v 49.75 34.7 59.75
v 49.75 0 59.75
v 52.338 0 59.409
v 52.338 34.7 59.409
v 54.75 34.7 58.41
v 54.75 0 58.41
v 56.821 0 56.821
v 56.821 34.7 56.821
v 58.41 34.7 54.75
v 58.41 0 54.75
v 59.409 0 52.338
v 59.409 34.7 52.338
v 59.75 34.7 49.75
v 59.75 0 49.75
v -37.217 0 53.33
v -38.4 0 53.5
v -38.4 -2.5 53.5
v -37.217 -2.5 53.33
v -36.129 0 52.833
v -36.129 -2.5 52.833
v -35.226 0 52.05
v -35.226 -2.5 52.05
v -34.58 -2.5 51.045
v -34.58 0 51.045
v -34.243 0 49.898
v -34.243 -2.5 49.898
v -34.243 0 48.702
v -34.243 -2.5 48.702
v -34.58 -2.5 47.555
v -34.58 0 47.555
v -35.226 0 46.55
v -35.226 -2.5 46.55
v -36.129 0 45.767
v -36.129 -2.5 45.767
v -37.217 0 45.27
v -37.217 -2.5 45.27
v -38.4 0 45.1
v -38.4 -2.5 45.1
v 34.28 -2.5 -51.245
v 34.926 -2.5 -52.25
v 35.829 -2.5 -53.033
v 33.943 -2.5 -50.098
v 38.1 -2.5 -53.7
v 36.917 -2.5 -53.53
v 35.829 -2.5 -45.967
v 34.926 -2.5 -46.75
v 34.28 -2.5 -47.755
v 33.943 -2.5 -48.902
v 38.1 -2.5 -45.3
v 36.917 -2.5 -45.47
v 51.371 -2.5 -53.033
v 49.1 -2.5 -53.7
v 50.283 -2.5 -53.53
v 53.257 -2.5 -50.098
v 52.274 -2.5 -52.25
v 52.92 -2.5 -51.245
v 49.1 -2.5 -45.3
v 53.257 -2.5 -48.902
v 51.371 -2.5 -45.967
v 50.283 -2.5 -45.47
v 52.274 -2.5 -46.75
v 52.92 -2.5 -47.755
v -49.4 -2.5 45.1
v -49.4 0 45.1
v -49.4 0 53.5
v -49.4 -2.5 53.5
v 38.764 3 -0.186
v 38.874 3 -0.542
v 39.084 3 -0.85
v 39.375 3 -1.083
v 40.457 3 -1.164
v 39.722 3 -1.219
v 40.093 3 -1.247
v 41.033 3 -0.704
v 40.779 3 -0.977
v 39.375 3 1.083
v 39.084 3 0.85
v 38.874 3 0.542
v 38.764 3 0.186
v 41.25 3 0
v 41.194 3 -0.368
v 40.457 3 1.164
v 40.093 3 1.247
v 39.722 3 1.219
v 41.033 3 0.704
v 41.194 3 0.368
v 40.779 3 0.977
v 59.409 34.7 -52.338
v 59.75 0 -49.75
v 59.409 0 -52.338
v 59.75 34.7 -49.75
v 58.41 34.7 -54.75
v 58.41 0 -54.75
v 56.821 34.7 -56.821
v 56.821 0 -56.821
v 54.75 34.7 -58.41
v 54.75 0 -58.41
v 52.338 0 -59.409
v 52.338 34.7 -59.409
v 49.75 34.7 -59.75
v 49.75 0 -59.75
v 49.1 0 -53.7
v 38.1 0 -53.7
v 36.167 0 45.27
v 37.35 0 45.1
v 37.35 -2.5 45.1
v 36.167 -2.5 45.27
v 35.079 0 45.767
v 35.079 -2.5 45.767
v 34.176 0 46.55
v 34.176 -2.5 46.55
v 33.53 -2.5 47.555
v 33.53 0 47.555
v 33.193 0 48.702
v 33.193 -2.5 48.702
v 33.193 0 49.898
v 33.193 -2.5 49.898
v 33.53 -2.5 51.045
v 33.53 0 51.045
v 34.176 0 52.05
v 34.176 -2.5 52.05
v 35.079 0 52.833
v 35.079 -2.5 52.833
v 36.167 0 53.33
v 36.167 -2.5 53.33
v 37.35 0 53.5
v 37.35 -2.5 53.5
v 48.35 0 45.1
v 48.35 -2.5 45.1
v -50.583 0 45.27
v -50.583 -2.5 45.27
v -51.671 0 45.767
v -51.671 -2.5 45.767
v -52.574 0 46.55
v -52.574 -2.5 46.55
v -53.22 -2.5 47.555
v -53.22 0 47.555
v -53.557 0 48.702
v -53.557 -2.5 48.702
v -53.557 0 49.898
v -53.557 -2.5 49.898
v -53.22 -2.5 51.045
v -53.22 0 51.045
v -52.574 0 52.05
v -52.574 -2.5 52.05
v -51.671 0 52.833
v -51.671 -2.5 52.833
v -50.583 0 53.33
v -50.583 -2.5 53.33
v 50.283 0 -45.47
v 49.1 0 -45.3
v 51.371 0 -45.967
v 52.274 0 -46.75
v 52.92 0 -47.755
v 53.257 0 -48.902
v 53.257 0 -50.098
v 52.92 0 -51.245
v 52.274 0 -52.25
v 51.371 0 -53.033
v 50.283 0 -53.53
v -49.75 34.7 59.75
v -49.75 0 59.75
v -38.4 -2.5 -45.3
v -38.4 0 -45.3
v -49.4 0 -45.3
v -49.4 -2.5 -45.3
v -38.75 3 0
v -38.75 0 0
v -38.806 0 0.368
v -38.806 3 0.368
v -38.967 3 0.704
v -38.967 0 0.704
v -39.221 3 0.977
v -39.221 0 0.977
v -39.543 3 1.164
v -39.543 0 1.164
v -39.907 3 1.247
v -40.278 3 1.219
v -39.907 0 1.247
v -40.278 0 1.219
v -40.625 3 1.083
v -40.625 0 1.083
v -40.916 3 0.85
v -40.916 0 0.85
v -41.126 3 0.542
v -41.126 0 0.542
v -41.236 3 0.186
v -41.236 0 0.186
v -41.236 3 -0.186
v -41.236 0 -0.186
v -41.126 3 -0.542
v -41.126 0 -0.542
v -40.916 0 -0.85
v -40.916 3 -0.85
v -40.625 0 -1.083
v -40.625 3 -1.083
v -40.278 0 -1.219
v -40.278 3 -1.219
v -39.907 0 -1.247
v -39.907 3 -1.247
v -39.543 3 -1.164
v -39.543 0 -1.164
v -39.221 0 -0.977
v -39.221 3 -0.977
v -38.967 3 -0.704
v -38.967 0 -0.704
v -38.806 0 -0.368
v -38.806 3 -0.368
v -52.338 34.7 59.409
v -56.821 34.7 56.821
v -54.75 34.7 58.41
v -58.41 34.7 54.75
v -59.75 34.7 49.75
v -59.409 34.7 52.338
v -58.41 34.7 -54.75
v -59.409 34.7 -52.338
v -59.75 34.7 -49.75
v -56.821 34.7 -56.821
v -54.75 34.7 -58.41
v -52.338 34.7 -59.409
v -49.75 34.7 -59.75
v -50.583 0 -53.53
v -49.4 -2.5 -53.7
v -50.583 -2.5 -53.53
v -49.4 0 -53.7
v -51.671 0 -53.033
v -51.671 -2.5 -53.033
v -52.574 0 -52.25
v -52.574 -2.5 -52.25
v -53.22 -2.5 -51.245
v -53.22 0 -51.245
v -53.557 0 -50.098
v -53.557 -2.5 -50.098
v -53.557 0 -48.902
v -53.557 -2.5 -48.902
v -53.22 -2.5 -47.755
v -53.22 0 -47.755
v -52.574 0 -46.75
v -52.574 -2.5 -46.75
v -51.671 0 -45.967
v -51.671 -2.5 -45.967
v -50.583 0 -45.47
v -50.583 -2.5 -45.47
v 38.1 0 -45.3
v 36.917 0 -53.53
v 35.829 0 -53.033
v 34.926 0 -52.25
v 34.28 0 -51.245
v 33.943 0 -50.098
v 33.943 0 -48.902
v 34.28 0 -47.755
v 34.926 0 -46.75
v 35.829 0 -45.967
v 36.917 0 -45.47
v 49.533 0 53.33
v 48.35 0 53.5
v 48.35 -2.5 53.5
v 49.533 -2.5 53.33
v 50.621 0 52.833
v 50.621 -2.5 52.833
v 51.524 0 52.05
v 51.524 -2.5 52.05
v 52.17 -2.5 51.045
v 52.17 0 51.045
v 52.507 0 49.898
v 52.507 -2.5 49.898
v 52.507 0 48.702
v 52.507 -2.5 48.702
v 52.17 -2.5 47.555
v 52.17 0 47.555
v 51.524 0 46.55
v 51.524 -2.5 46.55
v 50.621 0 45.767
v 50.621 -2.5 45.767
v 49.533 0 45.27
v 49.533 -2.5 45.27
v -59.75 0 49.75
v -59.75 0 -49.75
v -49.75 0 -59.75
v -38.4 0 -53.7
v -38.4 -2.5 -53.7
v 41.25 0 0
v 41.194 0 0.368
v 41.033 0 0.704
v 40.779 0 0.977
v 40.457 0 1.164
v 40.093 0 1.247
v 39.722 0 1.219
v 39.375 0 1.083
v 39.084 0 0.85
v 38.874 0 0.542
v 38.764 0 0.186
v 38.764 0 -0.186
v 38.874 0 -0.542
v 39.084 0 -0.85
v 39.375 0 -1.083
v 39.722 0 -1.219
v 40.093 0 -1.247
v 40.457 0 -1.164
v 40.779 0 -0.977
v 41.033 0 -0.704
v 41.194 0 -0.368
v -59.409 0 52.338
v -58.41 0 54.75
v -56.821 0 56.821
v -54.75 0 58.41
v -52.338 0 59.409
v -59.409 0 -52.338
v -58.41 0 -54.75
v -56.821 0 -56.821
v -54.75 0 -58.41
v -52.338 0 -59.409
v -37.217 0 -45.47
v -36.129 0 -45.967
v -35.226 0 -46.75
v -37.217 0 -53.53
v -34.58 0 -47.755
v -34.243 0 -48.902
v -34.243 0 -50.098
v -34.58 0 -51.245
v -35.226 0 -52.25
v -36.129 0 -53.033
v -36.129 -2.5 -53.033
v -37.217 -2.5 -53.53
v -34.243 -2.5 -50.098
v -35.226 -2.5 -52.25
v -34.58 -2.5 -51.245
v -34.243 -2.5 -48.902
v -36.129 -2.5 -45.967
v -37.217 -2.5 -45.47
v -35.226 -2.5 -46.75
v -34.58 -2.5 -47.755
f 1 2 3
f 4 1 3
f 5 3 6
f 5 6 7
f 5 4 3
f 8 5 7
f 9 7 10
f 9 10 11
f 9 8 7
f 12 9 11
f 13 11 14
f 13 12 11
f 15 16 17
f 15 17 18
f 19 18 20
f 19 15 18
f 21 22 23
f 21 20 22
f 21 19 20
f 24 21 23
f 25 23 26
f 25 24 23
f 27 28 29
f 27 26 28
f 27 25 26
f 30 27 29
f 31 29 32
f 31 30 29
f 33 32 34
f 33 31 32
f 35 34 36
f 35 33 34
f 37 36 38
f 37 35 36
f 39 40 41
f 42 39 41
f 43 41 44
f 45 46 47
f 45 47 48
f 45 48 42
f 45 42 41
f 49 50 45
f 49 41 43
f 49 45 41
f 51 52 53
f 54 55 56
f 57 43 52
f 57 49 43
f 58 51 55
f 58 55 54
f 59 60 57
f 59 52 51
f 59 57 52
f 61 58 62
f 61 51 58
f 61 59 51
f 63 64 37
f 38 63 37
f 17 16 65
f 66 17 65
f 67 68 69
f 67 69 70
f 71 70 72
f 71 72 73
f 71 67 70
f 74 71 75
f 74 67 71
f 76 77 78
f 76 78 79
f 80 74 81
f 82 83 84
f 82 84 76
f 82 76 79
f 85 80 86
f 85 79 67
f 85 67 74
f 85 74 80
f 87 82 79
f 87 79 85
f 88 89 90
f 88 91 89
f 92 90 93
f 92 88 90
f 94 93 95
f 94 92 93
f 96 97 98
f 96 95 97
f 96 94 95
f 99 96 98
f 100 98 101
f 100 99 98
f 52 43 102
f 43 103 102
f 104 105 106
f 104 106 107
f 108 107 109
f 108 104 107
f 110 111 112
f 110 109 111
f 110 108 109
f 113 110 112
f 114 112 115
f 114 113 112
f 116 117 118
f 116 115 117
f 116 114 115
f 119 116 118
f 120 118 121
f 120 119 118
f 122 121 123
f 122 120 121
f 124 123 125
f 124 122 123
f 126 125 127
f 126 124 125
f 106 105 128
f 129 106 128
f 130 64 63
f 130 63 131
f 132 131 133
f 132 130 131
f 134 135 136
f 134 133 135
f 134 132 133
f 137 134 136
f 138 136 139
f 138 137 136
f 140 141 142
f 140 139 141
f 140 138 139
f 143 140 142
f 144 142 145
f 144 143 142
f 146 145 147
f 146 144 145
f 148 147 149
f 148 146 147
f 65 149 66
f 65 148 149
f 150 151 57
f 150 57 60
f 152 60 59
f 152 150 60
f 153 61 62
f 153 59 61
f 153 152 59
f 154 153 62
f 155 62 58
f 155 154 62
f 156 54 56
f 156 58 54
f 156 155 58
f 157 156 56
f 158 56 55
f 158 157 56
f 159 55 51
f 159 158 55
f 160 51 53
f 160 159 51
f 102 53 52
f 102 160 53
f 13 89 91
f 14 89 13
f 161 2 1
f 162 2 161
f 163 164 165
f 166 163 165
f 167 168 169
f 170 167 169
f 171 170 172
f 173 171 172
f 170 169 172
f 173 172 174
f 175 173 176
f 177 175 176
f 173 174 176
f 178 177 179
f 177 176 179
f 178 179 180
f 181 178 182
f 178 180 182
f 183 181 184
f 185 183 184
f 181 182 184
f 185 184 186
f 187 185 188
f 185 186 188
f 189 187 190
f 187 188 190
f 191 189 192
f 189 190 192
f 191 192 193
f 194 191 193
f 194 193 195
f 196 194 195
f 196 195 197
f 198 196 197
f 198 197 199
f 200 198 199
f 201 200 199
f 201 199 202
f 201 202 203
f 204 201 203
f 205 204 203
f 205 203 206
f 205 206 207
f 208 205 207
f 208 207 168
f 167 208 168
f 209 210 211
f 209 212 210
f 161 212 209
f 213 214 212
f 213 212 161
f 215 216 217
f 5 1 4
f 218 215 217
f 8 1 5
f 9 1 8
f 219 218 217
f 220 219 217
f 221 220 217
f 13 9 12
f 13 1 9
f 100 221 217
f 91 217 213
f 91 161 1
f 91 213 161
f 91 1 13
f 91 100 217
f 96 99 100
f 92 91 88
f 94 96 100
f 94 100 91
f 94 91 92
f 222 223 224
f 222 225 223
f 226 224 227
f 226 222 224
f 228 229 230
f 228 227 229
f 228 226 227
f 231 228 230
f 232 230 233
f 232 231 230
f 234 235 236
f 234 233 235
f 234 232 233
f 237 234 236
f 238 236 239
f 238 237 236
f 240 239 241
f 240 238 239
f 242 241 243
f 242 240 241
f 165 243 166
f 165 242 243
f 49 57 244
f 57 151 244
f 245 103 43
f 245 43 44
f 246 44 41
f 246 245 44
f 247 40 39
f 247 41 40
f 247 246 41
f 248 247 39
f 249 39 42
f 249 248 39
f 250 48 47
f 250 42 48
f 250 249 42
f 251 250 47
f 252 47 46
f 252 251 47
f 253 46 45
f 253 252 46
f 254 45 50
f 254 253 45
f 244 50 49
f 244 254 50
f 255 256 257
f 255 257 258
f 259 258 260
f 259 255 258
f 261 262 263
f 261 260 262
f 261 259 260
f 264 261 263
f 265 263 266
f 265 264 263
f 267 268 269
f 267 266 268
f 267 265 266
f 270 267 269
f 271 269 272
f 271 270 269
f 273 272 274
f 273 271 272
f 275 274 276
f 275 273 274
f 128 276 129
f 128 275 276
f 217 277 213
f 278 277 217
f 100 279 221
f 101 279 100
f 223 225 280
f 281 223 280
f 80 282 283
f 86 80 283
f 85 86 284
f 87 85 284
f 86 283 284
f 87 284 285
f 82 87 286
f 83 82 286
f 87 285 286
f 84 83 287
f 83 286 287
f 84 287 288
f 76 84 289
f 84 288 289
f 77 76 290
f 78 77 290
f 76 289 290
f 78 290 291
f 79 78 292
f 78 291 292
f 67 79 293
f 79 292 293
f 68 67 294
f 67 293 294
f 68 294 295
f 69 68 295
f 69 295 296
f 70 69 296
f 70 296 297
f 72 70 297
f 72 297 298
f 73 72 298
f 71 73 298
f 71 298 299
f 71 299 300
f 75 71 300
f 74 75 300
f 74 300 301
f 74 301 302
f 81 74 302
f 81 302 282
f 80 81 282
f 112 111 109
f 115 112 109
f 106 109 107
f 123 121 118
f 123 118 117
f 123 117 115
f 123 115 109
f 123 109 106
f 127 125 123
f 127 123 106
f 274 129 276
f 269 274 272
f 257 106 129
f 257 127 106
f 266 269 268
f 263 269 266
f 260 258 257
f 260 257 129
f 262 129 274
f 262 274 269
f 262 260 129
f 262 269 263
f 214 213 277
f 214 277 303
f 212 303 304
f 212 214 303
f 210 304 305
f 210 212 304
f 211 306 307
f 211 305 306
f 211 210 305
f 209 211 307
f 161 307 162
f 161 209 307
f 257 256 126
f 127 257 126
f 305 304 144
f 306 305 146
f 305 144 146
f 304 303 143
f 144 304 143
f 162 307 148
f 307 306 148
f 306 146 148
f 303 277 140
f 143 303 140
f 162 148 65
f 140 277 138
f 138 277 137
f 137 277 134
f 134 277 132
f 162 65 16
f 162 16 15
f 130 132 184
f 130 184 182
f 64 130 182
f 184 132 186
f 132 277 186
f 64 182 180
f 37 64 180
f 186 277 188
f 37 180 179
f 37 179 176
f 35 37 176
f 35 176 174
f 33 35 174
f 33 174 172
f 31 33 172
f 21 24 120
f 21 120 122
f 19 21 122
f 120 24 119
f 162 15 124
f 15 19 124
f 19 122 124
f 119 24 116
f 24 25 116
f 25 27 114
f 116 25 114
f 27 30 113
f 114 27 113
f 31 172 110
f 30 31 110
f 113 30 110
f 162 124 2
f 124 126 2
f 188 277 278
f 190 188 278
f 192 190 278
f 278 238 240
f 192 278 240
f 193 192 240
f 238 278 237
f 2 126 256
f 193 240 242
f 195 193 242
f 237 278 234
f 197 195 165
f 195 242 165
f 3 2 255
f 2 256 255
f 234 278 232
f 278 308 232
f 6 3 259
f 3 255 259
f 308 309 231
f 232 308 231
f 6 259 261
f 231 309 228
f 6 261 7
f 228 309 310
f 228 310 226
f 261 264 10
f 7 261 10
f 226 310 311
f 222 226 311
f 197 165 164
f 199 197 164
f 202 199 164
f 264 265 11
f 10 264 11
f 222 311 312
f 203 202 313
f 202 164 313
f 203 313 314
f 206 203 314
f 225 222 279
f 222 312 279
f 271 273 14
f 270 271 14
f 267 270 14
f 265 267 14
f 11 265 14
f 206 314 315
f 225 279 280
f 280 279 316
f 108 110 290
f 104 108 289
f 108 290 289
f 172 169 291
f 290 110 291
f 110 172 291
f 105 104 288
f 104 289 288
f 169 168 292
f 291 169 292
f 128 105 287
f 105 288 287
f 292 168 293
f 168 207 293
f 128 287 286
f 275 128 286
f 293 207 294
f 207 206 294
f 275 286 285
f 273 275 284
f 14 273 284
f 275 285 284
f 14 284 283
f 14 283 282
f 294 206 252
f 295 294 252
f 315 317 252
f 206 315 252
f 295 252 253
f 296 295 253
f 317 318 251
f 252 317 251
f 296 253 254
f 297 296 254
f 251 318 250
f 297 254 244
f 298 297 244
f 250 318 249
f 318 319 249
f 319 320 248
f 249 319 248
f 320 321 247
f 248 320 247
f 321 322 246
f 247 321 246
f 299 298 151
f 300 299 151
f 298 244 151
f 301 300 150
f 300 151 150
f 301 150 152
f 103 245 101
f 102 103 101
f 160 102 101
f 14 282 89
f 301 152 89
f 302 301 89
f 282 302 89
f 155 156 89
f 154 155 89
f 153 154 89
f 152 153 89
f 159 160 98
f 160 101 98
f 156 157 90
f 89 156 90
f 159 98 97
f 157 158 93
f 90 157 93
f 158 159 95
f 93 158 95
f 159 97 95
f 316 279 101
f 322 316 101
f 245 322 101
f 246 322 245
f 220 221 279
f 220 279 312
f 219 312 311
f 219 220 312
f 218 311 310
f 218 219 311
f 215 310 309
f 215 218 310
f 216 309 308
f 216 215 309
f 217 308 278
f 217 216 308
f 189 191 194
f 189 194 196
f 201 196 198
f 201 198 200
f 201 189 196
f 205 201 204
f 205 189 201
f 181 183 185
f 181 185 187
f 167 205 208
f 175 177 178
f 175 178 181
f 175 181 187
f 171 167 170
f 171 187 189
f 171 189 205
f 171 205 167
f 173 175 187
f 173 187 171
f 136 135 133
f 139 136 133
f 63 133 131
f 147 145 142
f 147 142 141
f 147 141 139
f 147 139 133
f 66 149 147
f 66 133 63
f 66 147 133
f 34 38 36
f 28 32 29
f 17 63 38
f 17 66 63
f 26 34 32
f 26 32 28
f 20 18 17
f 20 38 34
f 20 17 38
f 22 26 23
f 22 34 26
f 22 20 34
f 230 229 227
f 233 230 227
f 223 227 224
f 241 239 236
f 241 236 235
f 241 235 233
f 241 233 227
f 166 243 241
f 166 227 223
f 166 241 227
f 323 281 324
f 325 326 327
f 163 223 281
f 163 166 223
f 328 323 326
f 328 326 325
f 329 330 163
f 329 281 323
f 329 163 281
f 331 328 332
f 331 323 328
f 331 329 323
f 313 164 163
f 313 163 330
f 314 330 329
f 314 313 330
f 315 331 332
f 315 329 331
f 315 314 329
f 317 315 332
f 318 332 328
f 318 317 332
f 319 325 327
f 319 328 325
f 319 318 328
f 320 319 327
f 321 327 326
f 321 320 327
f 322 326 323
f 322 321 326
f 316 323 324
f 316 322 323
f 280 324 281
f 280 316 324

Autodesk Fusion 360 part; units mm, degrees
sketch "Sketch1" plane through (0, 0, 0) normal (0, 1, 0) x (1, 0, 0)
  line L0 (59.75, -59.75) -> (-59.75, -59.75)
  line L1 (-59.75, -59.75) -> (-59.75, 59.75)
  line L2 (-59.75, 59.75) -> (59.75, 59.75)
  line L3 (59.75, 59.75) -> (59.75, -59.75)
  line L4 (59.75, -59.75) -> (-59.75, 59.75) construction
  line L5 (-59.75, -59.75) -> (59.75, 59.75) construction
  dimension "d2" = 119.5
extrude "Extrude1" add sketch "Sketch1" along normal blind 34.7
fillet "Fillet1" radius 10 4 edges at (-59.75, 17.35, 59.75) (59.75, 17.35, 59.75) (-59.75, 17.35, -59.75) (59.75, 17.35, -59.75)
sketch "Sketch4" plane through (0, 0, 0) normal (0, -1, 0) x (1, 0, 0)
  line L0 (-49.75, -59.75) -> (49.75, -59.75)
  line L1 (59.75, -49.75) -> (59.75, 49.75)
  line L2 (49.75, 59.75) -> (-49.75, 59.75)
  line L3 (-59.75, 49.75) -> (-59.75, -49.75)
  line L4 (-49.4, 45.1) -> (-38.4, 45.1)
  arc A0 (-38.4, 45.1) -> (-38.4, 53.5) centre (-38.4, 49.3) ccw
  line L5 (-38.4, 53.5) -> (-49.4, 53.5)
  arc A1 (-49.4, 53.5) -> (-49.4, 45.1) centre (-49.4, 49.3) ccw
  line L6 (-49.4, 49.3) -> (-38.4, 49.3) construction
  line L7 (-49.4, -53.7) -> (-38.4, -53.7)
  arc A2 (-38.4, -53.7) -> (-38.4, -45.3) centre (-38.4, -49.5) ccw
  line L8 (-38.4, -45.3) -> (-49.4, -45.3)
  arc A3 (-49.4, -45.3) -> (-49.4, -53.7) centre (-49.4, -49.5) ccw
  line L9 (-49.4, -49.5) -> (-38.4, -49.5) construction
  line L10 (49.1, -45.3) -> (38.1, -45.3)
  arc A4 (38.1, -45.3) -> (38.1, -53.7) centre (38.1, -49.5) ccw
  line L11 (38.1, -53.7) -> (49.1, -53.7)
  arc A5 (49.1, -53.7) -> (49.1, -45.3) centre (49.1, -49.5) ccw
  line L12 (49.1, -49.5) -> (38.1, -49.5) construction
  line L13 (37.35, 45.1) -> (48.35, 45.1)
  arc A6 (48.35, 45.1) -> (48.35, 53.5) centre (48.35, 49.3) ccw
  line L14 (48.35, 53.5) -> (37.35, 53.5)
  arc A7 (37.35, 53.5) -> (37.35, 45.1) centre (37.35, 49.3) ccw
  line L15 (37.35, 49.3) -> (48.35, 49.3) construction
  arc A8 (49.75, -59.75) -> (59.75, -49.75) centre (49.75, -49.75) ccw
  arc A9 (59.75, 49.75) -> (49.75, 59.75) centre (49.75, 49.75) ccw
  arc A10 (-49.75, 59.75) -> (-59.75, 49.75) centre (-49.75, 49.75) ccw
  arc A11 (-59.75, -49.75) -> (-49.75, -59.75) centre (-49.75, -49.75) ccw
  dimension "d6" = 4.2
  dimension "d7" = 11
  dimension "d8" = 49.4
  dimension "d9" = 49.3
  dimension "d14" = 37.35
  dimension "d15" = 49.5
  dimension "d16" = 49.1
extrude "Extrude2" add sketch "Sketch4" along normal blind 2.5 contours L4 A0 L5 A1 | L7 A2 L8 A3 | L10 A4 L11 A5 | L13 A6 L14 A7
sketch "Sketch5" plane through (0, 0, 0) normal (0, -1, 0) x (1, 0, 0)
  line L0 (37.35, 53.5) -> (48.35, 53.5)
  arc A0 (48.35, 45.1) -> (48.35, 53.5) centre (48.35, 49.3) ccw
  line L1 (48.35, 45.1) -> (37.35, 45.1)
  arc A1 (37.35, 53.5) -> (37.35, 45.1) centre (37.35, 49.3) ccw
  line L2 (-49.4, 53.5) -> (-38.4, 53.5)
  arc A2 (-38.4, 45.1) -> (-38.4, 53.5) centre (-38.4, 49.3) ccw
  line L3 (-38.4, 45.1) -> (-49.4, 45.1)
  arc A3 (-49.4, 53.5) -> (-49.4, 45.1) centre (-49.4, 49.3) ccw
  line L4 (49.1, -53.7) -> (38.1, -53.7)
  arc A4 (38.1, -45.3) -> (38.1, -53.7) centre (38.1, -49.5) ccw
  line L5 (38.1, -45.3) -> (49.1, -45.3)
  arc A5 (49.1, -53.7) -> (49.1, -45.3) centre (49.1, -49.5) ccw
  line L6 (-49.4, -45.3) -> (-38.4, -45.3)
  arc A6 (-38.4, -53.7) -> (-38.4, -45.3) centre (-38.4, -49.5) ccw
  line L7 (-38.4, -53.7) -> (-49.4, -53.7)
  arc A7 (-49.4, -45.3) -> (-49.4, -53.7) centre (-49.4, -49.5) ccw
  line L8 (-49.75, -59.75) -> (49.75, -59.75)
  line L9 (59.75, -49.75) -> (59.75, 49.75)
  line L10 (49.75, 59.75) -> (-49.75, 59.75)
  line L11 (-59.75, 49.75) -> (-59.75, -49.75)
  line L12 (-40, 0) -> (40, 0) construction
  circle A8 centre (-40, 0) radius 1.25
  circle A9 centre (40, 0) radius 1.25
  arc A10 (49.75, -59.75) -> (59.75, -49.75) centre (49.75, -49.75) ccw
  arc A11 (59.75, 49.75) -> (49.75, 59.75) centre (49.75, 49.75) ccw
  arc A12 (-49.75, 59.75) -> (-59.75, 49.75) centre (-49.75, 49.75) ccw
  arc A13 (-59.75, -49.75) -> (-49.75, -59.75) centre (-49.75, -49.75) ccw
  dimension "d17" = 2.5
  dimension "d18" = 80
extrude "Extrude3" cut sketch "Sketch5" against normal blind 3 contours A8 | A9
